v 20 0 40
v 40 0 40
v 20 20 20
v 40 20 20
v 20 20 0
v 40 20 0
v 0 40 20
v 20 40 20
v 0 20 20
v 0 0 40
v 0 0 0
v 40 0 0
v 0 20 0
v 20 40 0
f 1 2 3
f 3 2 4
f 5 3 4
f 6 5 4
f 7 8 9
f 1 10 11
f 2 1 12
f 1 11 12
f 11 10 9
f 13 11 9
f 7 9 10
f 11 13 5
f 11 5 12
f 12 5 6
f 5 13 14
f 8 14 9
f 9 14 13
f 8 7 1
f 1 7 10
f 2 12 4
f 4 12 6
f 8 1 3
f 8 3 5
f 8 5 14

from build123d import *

# Parameters (mm, degrees)
SKETCH1_W           = 40
SKETCH1_H           = 40
BOSS_EXTRUDE1_DEPTH = 40
SKETCH2_W           = 20
SKETCH2_H           = 20
CUT_EXTRUDE1_DEPTH  = 40
CUT_EXTRUDE2_DEPTH  = 20
CUT_EXTRUDE4_DEPTH  = 20
CUT_EXTRUDE5_DEPTH  = 20


with BuildPart() as part:
    # Sketch1 → Boss-Extrude1 (new body)
    with BuildSketch(Plane.XY):
        with Locations((20, 20)):
            Rectangle(SKETCH1_W, SKETCH1_H)
    extrude(amount=BOSS_EXTRUDE1_DEPTH)

    # Sketch2 → Cut-Extrude1 (cut)
    with BuildSketch(Plane.XY.offset(40)):
        with Locations((30, 30)):
            Rectangle(SKETCH2_W, SKETCH2_H)
    extrude(amount=-CUT_EXTRUDE1_DEPTH, mode=Mode.SUBTRACT)

    # Sketch3 → Cut-Extrude2 (cut)
    with BuildSketch(Plane(origin=(40, 0, 0), x_dir=(0, 0, -1), z_dir=(1, 0, 0))):
        Polygon((-40, 0), (-20, 20), (-40, 20), align=None)
    extrude(amount=-CUT_EXTRUDE2_DEPTH, mode=Mode.SUBTRACT)

    # Sketch5 → Cut-Extrude4 (cut)
    with BuildSketch(Plane(origin=(0, 0, 0), x_dir=(-1, 0, 0), z_dir=(0, 0, -1))):
        Polygon((-20, 40), (0, 20), (0, 40), align=None)
    extrude(amount=-CUT_EXTRUDE4_DEPTH, mode=Mode.SUBTRACT)

    # Sketch6 → Cut-Extrude5 (cut)
    with BuildSketch(Plane.ZY):
        Polygon((20, 40), (40, 0), (40, 40), align=None)
    extrude(amount=-CUT_EXTRUDE5_DEPTH, mode=Mode.SUBTRACT)


solid = part.part
